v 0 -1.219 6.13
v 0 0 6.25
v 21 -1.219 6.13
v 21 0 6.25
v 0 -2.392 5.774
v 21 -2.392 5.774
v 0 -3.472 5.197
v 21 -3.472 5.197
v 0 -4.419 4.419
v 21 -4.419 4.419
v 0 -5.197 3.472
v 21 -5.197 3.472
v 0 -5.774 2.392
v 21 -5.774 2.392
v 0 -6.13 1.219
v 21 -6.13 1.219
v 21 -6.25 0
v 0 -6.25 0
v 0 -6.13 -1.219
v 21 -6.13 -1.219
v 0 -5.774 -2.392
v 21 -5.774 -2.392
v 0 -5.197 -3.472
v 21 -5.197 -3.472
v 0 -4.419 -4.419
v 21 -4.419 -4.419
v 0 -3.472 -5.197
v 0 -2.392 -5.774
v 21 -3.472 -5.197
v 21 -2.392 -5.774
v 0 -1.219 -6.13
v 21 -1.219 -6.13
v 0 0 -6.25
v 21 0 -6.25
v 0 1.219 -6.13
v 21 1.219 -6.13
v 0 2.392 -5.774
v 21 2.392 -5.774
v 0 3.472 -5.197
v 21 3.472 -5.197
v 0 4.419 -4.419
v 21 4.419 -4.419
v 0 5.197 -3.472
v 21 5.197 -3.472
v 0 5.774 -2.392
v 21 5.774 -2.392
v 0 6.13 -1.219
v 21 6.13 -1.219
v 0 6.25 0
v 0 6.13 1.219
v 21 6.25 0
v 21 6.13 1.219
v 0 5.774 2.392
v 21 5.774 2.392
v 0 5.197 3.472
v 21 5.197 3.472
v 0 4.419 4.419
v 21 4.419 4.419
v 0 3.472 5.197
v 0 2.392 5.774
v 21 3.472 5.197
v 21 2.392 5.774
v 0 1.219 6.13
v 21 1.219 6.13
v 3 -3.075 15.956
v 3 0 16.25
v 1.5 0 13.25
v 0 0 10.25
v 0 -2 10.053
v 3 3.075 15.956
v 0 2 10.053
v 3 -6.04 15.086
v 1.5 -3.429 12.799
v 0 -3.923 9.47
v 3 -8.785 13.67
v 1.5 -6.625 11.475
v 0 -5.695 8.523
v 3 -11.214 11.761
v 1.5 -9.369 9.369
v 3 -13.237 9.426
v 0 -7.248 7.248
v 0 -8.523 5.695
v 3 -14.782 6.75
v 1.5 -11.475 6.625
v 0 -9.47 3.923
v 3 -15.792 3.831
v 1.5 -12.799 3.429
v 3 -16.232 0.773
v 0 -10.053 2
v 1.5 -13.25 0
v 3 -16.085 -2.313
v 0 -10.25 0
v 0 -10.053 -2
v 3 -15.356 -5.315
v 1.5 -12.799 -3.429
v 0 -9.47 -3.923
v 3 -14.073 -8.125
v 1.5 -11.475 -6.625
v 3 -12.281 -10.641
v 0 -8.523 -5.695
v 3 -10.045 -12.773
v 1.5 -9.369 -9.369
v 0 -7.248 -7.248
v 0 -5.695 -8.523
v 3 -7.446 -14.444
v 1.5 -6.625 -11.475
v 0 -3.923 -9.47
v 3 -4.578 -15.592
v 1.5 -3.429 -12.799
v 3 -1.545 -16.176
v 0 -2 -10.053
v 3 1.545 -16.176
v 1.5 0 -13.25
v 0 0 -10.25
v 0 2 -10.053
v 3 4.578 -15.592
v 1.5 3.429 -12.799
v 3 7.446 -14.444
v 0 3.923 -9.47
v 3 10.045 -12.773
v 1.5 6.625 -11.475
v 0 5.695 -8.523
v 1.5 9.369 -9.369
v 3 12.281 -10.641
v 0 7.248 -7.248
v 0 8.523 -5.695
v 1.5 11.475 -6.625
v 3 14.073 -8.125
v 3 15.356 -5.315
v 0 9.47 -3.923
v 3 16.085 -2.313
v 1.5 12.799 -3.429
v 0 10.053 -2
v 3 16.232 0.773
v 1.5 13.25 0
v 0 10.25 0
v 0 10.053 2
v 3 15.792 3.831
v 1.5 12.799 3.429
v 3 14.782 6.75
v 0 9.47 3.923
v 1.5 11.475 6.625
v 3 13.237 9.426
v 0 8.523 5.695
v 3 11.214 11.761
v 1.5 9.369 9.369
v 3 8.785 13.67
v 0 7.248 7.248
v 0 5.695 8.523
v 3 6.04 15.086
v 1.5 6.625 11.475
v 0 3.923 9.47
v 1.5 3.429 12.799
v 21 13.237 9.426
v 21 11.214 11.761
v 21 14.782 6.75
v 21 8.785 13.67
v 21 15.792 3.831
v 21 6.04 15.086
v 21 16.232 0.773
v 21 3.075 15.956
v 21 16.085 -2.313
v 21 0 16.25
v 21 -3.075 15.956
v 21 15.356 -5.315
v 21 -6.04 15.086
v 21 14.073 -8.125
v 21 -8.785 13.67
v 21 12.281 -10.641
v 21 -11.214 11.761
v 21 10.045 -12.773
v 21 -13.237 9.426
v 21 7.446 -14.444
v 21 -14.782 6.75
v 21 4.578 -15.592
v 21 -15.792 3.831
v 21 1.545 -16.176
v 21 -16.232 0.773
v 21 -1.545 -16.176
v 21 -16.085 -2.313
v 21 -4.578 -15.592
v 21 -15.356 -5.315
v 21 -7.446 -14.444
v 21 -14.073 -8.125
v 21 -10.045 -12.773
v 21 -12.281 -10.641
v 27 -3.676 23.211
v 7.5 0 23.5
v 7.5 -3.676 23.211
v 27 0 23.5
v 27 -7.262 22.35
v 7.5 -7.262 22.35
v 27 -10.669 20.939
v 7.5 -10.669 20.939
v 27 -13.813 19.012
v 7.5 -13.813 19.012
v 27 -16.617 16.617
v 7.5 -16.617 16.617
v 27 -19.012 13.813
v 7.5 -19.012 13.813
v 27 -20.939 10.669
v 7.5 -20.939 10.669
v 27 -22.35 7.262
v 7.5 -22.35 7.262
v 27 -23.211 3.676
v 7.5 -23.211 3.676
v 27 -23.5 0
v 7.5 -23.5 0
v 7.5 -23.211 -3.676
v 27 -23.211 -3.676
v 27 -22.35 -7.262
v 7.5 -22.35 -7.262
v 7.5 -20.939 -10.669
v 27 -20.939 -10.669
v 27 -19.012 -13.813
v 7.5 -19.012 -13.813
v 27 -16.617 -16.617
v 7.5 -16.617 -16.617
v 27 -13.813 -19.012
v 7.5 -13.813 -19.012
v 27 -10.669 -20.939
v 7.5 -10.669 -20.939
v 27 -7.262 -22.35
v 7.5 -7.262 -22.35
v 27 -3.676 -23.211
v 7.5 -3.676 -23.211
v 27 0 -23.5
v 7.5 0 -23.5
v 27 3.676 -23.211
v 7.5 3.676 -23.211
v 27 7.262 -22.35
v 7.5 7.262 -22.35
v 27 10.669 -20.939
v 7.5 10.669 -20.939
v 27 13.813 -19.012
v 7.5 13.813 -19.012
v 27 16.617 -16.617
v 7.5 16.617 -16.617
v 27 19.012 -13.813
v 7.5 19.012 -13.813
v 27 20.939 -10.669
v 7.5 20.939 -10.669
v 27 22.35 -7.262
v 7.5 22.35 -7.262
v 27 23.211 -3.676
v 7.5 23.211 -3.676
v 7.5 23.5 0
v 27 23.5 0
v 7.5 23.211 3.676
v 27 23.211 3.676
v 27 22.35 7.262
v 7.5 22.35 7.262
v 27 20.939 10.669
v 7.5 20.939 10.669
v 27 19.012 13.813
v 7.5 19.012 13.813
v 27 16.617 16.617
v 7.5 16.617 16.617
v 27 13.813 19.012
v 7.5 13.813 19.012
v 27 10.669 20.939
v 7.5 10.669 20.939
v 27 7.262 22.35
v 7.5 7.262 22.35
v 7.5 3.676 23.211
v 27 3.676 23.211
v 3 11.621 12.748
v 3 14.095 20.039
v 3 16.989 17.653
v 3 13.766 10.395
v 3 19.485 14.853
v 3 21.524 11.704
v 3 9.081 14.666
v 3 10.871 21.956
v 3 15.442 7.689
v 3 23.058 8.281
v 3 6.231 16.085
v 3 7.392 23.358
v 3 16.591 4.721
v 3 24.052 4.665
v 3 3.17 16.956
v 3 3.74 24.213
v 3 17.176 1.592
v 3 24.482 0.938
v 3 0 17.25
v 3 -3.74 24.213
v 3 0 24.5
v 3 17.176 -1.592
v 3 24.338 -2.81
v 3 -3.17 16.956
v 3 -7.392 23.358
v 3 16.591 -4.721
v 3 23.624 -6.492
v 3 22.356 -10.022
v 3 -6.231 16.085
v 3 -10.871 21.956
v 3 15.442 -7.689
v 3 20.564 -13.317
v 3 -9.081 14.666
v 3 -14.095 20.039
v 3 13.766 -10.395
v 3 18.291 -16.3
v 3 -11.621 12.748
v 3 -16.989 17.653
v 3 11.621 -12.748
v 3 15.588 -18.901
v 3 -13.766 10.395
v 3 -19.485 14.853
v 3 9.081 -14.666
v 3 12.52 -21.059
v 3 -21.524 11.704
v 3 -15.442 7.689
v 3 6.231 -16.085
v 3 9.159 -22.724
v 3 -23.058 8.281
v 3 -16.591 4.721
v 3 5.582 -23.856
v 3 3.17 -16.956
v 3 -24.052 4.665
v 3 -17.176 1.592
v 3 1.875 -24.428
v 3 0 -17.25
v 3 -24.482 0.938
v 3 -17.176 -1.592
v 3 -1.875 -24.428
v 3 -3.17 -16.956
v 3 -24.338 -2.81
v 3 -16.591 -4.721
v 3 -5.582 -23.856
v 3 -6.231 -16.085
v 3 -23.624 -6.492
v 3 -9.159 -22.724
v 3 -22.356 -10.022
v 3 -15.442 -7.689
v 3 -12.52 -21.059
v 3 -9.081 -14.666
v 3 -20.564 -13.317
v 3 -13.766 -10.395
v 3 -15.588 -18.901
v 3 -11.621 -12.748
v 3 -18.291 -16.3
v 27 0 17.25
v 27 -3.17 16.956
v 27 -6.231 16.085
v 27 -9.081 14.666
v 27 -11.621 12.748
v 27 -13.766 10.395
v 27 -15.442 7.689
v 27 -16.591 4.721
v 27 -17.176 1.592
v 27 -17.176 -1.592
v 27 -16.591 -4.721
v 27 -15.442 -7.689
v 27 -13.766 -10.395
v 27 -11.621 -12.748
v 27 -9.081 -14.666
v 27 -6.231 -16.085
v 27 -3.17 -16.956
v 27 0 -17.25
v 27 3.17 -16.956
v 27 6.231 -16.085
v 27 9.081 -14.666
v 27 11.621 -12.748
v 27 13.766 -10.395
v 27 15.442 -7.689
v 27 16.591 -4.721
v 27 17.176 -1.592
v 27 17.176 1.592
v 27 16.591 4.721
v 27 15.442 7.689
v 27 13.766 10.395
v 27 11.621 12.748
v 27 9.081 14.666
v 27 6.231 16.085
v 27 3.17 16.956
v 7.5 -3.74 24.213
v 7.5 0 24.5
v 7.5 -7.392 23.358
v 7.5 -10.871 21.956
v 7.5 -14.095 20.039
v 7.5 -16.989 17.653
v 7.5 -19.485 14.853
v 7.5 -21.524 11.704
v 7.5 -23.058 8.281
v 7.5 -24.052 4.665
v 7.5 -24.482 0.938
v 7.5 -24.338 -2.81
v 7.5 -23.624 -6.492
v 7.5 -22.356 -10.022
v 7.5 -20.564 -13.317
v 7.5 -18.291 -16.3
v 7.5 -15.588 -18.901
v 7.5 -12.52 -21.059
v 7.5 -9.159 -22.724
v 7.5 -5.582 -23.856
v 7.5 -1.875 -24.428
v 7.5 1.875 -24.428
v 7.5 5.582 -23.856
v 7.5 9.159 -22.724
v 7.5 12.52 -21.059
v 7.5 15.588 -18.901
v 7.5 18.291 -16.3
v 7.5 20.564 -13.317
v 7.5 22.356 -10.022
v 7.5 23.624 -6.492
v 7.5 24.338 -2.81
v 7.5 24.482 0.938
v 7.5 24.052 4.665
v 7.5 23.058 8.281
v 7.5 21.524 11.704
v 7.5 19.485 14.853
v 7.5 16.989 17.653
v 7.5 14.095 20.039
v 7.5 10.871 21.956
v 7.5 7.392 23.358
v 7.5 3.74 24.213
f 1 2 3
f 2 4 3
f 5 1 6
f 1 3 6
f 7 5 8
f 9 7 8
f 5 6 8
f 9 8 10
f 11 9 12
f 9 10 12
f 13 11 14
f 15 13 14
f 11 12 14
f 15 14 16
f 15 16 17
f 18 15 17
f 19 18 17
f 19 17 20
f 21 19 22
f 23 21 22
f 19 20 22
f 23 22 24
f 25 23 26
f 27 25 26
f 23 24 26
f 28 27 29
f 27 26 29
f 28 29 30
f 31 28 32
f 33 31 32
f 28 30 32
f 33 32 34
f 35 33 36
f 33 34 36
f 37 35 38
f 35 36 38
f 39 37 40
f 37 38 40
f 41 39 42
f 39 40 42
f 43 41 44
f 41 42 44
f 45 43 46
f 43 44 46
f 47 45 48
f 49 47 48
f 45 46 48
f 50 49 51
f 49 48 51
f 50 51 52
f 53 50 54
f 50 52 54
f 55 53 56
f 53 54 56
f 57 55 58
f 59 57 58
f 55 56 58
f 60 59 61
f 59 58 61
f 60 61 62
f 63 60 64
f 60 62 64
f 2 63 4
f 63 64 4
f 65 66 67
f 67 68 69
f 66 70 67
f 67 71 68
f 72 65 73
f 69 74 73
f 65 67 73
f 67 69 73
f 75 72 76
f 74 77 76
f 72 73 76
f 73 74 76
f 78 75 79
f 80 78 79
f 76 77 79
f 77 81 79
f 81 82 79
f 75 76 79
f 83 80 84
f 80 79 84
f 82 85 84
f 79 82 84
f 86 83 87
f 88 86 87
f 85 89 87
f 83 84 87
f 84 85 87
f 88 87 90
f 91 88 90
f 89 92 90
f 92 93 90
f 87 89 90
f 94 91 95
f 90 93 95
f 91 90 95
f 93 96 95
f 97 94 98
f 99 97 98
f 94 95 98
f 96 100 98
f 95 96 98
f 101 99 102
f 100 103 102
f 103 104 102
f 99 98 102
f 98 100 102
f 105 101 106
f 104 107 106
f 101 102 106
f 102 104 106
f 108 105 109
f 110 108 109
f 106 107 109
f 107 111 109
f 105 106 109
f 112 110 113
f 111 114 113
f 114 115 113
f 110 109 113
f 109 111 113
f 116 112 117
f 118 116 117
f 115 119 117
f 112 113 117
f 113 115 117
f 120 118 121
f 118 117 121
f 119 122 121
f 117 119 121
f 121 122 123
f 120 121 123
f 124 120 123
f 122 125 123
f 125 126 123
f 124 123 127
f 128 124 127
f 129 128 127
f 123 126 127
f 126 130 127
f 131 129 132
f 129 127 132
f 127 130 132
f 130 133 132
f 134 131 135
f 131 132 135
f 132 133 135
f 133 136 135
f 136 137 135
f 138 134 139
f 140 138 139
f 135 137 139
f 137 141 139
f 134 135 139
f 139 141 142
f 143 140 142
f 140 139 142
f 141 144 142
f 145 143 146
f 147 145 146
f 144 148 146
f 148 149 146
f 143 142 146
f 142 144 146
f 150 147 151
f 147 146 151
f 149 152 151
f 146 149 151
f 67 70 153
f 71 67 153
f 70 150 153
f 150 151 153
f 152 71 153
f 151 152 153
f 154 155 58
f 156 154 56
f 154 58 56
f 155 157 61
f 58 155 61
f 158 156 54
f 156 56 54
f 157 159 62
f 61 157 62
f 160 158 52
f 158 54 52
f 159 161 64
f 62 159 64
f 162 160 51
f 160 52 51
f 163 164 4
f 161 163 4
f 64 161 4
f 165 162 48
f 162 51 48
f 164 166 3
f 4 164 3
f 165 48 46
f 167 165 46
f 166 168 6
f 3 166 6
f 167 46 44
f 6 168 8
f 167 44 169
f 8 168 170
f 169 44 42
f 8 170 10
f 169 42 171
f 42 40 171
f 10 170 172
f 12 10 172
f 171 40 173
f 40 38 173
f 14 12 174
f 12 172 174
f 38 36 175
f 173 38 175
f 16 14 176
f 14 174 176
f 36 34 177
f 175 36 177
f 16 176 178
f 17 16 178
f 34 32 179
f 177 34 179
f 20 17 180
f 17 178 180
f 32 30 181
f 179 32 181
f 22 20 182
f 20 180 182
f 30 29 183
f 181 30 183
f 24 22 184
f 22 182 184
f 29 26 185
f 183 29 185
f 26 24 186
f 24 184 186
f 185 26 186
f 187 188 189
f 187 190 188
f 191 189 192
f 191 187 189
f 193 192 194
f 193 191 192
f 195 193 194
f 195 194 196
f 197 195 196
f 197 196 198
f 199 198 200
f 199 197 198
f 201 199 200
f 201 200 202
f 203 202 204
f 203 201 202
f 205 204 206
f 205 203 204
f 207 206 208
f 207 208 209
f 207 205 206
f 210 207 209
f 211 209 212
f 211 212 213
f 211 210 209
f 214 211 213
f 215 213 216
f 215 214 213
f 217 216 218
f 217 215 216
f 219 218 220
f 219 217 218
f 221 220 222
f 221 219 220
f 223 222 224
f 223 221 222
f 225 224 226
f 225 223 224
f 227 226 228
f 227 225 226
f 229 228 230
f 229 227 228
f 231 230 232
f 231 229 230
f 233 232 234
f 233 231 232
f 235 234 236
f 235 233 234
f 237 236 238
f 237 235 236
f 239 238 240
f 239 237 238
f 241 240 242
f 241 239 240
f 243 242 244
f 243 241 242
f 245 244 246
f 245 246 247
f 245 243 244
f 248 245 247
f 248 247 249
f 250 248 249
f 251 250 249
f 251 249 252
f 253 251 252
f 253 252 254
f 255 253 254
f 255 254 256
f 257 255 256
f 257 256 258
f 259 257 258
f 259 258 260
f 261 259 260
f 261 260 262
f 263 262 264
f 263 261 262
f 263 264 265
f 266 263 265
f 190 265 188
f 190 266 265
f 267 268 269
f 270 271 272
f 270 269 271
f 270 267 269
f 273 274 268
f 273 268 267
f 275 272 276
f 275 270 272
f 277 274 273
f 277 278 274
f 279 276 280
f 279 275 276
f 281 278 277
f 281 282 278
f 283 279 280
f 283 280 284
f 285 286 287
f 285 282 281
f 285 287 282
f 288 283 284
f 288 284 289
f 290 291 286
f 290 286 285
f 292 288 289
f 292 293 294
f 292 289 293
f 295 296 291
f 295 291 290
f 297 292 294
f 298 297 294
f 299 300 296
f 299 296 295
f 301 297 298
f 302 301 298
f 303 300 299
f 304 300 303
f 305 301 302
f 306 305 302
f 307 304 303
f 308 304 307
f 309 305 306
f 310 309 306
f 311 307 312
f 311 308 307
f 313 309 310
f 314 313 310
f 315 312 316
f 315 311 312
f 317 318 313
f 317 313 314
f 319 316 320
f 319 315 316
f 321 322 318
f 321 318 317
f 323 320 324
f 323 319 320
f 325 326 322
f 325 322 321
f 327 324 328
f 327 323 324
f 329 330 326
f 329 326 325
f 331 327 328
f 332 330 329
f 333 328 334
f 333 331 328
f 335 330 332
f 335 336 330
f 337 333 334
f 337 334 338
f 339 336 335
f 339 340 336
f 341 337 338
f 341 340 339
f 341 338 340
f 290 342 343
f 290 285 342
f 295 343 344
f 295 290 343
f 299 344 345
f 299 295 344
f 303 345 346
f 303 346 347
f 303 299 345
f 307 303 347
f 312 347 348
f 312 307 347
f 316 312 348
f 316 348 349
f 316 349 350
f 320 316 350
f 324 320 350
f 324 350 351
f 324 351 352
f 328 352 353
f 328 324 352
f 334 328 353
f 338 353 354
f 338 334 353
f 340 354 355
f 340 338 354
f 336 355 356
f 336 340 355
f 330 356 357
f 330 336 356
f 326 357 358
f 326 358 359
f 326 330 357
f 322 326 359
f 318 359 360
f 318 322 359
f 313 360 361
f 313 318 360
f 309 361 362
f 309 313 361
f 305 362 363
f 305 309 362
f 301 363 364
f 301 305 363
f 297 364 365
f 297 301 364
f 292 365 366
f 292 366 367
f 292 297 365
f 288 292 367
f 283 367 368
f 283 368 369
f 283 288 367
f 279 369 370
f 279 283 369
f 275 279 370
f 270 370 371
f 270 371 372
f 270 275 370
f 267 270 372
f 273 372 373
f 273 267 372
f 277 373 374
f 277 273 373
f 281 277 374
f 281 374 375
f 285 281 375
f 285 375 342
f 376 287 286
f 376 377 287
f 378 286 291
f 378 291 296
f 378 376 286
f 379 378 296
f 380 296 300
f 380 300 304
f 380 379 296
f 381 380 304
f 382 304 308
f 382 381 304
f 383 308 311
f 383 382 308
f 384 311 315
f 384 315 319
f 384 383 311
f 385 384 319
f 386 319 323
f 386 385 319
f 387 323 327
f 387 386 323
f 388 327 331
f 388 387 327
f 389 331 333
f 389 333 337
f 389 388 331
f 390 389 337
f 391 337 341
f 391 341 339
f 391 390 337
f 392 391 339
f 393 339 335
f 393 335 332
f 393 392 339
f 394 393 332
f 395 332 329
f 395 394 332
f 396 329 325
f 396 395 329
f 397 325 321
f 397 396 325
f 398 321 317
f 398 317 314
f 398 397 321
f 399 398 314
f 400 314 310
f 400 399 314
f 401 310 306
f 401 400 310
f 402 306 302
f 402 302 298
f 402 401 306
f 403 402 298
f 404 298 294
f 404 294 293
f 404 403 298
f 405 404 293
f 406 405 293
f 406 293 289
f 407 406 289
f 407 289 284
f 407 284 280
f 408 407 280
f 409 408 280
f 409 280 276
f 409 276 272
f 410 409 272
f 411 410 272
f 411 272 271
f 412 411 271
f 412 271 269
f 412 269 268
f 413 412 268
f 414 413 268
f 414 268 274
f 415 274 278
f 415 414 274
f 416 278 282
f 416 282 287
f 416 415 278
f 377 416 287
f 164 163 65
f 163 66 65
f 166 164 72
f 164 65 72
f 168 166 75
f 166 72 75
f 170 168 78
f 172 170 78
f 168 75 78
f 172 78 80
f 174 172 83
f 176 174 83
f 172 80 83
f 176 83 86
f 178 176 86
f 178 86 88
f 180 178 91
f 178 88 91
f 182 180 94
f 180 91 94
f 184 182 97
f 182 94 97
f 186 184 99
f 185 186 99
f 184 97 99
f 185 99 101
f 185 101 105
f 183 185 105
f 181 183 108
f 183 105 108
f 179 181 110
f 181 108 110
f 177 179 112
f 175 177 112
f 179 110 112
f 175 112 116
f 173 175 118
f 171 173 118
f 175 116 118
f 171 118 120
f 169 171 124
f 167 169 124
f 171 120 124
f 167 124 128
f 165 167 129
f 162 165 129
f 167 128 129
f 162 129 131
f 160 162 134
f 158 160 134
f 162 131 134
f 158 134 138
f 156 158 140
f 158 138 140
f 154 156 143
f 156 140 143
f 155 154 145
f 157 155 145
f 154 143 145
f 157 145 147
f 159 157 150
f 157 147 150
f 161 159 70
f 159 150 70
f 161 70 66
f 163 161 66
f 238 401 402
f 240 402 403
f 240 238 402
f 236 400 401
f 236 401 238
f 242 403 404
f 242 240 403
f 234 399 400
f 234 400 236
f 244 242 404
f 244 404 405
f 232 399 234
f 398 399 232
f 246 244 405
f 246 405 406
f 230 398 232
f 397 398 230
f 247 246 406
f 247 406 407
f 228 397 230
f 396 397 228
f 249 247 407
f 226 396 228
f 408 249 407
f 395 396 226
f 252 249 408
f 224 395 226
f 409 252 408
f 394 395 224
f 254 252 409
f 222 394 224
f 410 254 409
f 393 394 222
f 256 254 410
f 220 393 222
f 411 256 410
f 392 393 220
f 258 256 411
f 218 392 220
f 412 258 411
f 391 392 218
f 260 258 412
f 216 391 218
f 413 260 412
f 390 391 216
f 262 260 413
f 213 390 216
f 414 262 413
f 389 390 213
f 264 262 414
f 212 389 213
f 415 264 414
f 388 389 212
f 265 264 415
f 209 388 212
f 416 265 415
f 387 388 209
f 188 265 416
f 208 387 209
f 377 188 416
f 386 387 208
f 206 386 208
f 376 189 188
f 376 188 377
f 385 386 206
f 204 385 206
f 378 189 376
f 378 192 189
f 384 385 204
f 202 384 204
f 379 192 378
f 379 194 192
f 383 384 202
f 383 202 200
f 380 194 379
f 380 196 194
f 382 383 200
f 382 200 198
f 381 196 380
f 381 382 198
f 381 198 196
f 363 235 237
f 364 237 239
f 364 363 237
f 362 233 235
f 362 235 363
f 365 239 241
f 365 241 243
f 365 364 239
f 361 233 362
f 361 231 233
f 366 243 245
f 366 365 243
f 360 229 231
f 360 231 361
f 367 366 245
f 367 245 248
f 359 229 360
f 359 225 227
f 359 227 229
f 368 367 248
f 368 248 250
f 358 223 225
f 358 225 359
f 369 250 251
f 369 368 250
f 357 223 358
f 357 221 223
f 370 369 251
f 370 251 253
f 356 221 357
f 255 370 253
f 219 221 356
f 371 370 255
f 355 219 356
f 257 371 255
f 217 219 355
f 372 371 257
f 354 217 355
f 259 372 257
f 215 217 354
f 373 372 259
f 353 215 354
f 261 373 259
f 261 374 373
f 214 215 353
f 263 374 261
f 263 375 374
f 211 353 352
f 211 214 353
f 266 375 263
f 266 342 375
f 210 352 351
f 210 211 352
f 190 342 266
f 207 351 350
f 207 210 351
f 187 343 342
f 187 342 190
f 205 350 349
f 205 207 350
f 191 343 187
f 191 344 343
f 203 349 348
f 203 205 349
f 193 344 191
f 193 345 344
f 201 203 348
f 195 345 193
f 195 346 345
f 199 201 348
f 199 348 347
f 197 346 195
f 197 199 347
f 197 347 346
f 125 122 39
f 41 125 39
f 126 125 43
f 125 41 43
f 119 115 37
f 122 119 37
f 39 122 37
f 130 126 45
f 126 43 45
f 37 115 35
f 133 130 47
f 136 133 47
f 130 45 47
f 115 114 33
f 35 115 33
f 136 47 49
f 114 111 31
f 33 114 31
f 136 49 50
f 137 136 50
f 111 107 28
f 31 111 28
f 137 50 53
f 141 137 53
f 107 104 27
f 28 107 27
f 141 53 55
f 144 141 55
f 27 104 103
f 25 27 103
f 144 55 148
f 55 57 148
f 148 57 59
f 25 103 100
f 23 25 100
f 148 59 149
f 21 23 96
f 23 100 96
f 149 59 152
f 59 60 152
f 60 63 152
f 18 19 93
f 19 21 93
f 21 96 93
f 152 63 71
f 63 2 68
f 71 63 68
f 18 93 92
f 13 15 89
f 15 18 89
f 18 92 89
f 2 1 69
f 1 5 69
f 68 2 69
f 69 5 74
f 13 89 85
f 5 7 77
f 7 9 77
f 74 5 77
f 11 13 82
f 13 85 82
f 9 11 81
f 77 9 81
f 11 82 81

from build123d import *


with BuildPart() as part:
    # Çizim1 → Döndür1 (revolve)
    with BuildSketch(Plane.XY, mode=Mode.PRIVATE) as d_nd_r1_sk:
        Polygon((0, 6.25), (21, 6.25), (21, 16.25), (3, 16.25), (0, 10.25), align=None)
        Polygon((7.5, 24.5), (7.5, 23.5), (27, 23.5), (27, 17.25), (3, 17.25), (3, 24.5), align=None)
    revolve(d_nd_r1_sk.sketch.rotate(Axis((0, 0, 0), (1, 0, 0)), 90), axis=Axis((0, 0, 0), (1, 0, 0)))


solid = part.part
